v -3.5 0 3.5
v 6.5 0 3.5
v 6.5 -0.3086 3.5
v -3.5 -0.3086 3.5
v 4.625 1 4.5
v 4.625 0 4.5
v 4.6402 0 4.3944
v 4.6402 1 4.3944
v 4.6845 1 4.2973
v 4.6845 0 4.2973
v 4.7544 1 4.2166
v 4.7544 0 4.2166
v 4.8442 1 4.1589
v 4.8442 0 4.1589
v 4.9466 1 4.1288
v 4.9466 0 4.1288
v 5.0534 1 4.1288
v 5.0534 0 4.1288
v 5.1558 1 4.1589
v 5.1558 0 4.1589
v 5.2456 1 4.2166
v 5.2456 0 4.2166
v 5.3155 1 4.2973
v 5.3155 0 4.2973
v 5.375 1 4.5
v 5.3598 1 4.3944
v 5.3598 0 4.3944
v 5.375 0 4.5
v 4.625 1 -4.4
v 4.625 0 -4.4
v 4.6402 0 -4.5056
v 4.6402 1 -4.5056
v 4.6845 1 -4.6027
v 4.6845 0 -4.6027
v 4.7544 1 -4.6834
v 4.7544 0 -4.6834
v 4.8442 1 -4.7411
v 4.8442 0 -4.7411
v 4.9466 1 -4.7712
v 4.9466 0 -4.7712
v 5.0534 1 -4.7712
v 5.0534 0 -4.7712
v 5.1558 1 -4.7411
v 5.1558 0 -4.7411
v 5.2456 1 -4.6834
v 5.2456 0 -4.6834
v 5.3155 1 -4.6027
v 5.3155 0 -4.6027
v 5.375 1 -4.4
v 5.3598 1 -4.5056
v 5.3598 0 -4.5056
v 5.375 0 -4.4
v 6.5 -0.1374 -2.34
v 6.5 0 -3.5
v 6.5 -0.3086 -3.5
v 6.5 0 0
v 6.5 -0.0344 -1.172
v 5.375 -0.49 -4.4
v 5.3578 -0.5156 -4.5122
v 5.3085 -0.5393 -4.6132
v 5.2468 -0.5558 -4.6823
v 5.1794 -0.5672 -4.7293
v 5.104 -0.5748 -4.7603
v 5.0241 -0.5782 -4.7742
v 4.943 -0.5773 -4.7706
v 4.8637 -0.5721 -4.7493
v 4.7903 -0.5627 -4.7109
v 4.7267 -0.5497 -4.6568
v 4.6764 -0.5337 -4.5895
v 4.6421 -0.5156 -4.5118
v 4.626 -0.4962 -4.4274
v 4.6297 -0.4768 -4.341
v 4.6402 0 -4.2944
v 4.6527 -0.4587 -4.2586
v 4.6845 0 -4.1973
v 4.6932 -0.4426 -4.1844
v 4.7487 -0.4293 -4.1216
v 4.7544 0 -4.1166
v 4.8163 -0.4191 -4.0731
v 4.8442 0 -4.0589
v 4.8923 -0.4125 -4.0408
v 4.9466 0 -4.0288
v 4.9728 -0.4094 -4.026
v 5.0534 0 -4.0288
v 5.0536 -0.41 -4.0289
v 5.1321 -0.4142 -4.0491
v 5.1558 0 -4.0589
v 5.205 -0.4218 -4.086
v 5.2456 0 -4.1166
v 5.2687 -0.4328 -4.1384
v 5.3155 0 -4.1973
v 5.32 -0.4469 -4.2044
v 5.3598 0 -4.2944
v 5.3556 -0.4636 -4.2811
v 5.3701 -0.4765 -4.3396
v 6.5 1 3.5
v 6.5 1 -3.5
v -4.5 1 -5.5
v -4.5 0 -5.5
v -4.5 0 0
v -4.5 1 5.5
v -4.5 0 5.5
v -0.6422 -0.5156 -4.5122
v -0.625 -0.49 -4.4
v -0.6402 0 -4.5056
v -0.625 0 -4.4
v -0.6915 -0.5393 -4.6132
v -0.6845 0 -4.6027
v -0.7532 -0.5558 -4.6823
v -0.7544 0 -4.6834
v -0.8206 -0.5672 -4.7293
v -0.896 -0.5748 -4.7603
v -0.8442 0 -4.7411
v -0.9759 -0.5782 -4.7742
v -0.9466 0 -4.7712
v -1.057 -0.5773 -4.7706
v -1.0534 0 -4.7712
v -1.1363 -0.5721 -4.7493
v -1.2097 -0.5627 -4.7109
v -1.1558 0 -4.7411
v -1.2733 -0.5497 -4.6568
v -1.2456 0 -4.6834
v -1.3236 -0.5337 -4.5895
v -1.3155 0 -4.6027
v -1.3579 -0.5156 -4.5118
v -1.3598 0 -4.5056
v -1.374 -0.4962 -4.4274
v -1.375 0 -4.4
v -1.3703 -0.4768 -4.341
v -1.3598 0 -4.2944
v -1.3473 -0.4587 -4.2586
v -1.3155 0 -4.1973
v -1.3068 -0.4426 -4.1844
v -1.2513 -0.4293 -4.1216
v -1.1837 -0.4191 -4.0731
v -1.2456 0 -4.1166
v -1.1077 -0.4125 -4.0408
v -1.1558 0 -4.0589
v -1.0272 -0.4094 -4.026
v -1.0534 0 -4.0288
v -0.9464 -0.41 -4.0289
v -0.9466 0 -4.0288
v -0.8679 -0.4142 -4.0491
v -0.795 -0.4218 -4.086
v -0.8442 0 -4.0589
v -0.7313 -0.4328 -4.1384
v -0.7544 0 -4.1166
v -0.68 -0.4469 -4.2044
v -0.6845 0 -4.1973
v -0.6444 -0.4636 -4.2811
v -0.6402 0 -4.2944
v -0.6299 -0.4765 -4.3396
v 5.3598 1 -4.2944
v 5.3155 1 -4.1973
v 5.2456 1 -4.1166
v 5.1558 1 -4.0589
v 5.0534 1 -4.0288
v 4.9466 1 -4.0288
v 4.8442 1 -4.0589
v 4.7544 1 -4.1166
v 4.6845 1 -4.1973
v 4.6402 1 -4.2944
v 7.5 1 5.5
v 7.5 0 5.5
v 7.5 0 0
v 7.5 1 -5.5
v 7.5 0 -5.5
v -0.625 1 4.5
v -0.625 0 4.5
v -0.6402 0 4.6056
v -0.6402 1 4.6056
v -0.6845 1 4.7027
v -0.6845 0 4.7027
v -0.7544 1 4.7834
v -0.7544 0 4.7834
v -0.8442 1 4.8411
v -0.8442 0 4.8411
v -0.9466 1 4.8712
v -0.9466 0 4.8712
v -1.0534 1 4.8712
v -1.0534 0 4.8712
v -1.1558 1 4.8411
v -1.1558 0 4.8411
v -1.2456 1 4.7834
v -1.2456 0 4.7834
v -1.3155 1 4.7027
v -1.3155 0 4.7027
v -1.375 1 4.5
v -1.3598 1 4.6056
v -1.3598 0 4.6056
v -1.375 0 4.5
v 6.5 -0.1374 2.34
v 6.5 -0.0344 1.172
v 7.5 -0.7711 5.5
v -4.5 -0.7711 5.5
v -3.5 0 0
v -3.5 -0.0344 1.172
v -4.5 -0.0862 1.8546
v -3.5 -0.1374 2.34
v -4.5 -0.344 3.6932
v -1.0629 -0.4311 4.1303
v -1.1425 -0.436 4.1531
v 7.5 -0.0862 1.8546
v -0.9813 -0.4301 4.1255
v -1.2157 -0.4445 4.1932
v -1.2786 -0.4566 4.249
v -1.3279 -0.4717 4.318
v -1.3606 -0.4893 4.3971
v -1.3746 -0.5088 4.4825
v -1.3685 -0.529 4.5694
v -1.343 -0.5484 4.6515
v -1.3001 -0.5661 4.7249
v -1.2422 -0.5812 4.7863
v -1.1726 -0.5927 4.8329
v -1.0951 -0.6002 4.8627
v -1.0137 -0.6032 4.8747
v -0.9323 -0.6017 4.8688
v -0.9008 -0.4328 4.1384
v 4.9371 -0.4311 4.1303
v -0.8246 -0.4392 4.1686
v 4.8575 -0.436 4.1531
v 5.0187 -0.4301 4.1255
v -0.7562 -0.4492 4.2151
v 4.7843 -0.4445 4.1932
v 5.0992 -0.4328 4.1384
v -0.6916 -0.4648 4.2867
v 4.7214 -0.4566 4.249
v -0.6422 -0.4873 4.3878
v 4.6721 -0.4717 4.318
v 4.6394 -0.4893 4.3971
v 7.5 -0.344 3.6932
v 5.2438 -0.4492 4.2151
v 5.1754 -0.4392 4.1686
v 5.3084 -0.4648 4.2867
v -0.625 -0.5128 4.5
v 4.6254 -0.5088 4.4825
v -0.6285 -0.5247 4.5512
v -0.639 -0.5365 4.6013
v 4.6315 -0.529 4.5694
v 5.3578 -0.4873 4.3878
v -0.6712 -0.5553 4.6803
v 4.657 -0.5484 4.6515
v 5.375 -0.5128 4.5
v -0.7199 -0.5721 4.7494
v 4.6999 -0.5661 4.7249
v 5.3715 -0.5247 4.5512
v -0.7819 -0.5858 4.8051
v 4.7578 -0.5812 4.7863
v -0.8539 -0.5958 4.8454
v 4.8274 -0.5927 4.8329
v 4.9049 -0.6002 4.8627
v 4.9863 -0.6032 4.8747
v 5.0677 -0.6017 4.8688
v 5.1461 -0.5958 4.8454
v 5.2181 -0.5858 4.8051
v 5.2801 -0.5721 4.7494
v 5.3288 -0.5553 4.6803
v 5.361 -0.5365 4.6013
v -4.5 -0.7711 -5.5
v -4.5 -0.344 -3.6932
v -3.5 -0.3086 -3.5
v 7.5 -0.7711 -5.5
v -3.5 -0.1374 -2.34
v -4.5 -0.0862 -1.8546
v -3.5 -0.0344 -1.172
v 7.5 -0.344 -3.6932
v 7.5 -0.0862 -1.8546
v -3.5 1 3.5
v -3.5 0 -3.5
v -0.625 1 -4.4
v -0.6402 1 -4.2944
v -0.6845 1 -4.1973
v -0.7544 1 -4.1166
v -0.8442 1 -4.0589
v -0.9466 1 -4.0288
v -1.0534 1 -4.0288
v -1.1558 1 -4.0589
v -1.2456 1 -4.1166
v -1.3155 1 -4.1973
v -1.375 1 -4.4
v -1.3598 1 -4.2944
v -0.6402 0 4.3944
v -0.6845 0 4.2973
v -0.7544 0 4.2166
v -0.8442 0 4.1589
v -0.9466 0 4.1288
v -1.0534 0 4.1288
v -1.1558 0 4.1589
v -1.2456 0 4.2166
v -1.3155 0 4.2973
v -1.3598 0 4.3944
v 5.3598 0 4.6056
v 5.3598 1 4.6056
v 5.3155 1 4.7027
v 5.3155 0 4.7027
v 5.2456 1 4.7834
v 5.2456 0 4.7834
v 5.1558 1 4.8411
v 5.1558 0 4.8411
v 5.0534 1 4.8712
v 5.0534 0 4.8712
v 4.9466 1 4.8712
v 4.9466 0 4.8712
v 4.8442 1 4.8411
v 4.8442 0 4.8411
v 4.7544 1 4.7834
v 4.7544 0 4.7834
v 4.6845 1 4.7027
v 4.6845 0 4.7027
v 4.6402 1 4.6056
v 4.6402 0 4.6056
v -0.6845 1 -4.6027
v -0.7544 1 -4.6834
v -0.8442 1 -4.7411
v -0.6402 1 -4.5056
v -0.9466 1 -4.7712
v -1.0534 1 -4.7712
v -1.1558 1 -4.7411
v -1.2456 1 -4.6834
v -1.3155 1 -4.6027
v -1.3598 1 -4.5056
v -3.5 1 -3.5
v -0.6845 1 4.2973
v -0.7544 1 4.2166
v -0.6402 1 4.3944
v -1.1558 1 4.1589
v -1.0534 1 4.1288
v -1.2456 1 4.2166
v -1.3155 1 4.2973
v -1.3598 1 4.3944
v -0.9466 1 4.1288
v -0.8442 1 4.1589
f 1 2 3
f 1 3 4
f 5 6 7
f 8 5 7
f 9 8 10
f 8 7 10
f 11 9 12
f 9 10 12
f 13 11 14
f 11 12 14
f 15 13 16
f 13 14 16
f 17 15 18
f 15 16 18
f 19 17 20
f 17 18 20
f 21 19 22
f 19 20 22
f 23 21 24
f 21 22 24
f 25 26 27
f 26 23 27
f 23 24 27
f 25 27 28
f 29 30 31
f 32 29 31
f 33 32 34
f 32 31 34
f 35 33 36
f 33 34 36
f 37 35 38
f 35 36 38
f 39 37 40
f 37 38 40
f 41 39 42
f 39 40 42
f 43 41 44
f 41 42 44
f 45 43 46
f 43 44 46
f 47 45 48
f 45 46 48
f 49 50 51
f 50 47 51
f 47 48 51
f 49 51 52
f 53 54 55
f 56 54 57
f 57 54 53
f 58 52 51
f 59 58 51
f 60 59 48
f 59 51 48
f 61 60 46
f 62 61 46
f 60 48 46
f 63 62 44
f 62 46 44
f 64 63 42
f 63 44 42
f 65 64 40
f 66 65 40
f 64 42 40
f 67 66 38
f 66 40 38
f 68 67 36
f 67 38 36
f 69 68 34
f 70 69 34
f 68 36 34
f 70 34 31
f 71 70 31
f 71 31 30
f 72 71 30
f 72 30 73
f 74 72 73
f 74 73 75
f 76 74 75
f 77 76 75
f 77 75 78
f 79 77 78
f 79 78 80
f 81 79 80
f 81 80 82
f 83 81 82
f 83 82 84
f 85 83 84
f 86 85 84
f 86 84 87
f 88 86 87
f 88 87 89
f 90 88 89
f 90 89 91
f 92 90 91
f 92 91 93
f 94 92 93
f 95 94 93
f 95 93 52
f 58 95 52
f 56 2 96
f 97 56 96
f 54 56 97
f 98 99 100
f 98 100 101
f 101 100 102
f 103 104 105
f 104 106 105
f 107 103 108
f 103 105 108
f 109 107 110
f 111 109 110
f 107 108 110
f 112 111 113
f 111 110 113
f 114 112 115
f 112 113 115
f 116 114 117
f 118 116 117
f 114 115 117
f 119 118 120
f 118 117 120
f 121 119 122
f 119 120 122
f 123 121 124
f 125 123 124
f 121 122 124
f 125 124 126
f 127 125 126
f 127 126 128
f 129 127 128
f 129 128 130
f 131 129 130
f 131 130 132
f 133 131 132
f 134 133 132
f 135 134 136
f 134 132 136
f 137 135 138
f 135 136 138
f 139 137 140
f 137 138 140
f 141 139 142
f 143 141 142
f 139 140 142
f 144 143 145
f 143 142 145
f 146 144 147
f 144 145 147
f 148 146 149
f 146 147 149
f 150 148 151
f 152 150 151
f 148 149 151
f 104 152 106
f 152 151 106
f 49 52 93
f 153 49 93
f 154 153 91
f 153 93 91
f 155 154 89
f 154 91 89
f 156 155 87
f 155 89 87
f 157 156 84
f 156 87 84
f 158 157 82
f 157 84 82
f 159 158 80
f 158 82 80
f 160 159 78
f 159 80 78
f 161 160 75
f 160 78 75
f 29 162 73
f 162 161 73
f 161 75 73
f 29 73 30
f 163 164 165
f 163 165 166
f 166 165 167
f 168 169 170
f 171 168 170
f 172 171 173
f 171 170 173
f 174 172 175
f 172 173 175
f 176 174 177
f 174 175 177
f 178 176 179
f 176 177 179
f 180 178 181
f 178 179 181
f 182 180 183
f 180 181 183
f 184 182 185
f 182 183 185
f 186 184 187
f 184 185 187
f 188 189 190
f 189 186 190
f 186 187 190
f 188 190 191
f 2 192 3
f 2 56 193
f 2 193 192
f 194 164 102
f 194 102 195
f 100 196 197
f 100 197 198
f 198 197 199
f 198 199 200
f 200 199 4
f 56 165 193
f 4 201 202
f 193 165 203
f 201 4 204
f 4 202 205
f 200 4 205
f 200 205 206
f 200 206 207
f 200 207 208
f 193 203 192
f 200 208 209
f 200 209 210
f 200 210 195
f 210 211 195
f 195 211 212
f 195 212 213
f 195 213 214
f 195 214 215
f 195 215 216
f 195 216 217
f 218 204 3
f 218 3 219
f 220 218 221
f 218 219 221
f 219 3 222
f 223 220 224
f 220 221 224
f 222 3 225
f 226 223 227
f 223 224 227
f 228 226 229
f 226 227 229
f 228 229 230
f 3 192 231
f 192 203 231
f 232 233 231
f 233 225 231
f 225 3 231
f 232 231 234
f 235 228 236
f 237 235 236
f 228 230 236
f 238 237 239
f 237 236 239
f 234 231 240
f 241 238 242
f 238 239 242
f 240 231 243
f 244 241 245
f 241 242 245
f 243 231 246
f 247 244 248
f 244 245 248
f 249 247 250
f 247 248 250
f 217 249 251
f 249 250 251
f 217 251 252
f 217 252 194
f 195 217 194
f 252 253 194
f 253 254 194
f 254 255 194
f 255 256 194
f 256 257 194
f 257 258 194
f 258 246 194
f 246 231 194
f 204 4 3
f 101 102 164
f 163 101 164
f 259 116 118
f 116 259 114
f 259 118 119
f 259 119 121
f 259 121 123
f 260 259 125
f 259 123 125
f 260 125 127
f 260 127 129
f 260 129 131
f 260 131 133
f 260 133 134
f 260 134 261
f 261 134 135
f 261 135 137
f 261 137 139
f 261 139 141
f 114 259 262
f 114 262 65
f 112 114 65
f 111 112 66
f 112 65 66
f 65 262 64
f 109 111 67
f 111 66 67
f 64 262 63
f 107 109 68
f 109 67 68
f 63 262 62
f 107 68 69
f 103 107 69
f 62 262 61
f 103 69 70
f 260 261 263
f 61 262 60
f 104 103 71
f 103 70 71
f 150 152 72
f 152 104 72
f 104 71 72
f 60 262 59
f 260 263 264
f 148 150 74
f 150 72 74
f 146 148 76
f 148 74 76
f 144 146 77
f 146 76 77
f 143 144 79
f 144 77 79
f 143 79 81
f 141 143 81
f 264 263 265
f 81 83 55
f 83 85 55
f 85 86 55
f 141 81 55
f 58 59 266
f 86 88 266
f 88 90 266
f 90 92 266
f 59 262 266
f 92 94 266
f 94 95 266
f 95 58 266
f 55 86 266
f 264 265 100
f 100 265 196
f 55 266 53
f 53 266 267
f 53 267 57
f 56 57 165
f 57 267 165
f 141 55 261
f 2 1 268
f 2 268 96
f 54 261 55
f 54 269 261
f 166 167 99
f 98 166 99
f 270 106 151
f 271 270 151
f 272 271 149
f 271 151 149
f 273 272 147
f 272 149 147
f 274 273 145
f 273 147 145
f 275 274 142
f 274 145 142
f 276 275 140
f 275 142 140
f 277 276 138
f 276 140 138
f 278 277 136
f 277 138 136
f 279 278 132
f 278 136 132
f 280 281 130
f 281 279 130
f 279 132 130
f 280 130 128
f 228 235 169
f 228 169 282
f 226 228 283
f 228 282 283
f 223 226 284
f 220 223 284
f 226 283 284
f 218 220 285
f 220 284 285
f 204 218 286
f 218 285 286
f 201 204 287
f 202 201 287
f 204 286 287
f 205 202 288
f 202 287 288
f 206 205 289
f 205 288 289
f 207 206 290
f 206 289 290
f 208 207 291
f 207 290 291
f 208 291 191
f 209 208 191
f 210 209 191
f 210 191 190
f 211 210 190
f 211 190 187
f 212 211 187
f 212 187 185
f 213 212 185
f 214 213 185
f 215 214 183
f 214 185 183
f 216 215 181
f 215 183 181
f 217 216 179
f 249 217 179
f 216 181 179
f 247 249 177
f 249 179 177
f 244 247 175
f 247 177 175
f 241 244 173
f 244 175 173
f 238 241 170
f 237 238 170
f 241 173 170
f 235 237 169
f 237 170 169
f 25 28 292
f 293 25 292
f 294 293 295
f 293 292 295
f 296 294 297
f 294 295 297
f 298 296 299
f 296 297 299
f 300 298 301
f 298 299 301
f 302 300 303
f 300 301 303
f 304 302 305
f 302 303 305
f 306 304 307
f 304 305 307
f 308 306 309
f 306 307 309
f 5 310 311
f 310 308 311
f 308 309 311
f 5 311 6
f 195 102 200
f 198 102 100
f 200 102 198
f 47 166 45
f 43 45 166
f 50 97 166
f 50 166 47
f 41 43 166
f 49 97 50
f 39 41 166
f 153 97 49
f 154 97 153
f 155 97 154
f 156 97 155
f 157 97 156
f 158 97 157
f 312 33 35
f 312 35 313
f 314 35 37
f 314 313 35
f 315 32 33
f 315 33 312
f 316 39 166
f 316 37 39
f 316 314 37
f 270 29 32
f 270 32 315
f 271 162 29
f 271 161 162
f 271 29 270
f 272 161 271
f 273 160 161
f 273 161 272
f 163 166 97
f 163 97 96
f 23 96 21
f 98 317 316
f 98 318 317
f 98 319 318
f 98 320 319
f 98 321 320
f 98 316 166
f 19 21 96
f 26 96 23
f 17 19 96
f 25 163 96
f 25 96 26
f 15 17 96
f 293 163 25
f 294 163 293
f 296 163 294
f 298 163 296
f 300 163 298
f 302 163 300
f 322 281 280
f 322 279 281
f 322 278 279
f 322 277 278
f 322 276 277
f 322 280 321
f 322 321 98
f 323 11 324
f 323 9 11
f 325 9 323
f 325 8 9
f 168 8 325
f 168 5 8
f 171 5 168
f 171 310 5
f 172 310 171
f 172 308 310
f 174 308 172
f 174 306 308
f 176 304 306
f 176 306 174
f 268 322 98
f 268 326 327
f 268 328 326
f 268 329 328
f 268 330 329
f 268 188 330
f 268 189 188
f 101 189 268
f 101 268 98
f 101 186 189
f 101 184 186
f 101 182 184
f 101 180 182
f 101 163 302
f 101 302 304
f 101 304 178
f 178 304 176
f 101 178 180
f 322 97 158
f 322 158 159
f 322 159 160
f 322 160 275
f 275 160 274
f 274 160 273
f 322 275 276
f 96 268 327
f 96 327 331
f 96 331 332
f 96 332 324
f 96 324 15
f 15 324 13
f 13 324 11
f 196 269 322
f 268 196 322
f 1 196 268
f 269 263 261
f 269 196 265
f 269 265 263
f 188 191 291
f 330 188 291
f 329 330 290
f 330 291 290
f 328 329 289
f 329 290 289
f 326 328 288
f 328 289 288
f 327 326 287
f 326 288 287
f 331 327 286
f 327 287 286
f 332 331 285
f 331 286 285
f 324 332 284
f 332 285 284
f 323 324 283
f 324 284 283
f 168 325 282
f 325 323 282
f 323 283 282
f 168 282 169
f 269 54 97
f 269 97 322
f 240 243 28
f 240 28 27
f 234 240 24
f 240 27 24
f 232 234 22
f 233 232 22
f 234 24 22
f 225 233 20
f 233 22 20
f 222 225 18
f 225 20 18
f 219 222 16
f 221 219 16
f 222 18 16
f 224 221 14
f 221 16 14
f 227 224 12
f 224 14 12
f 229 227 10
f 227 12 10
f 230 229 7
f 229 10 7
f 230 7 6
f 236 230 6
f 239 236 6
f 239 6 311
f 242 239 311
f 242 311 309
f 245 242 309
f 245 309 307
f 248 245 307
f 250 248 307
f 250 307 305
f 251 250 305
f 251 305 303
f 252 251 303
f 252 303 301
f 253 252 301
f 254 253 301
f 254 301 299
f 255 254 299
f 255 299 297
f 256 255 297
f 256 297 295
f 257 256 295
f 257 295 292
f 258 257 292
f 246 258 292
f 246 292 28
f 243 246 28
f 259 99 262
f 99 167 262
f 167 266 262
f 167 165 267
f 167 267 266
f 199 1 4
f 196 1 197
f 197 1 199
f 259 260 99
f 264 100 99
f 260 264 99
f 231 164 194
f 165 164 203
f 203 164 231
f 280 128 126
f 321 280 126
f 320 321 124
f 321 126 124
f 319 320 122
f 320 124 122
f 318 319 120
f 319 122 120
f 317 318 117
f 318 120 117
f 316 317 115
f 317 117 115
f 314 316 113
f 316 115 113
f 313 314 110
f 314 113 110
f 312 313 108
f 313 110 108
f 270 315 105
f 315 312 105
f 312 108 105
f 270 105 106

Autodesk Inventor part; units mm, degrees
ref_plane "YZ Plane" through (0, 0, 0) normal (1, 0, 0) x (0, 1, 0)
ref_plane "XZ Plane" through (0, 0, 0) normal (0, 1, 0) x (-1, 0, 0)
ref_plane "XY Plane" through (0, 0, 0) normal (0, 0, 1) x (1, 0, 0)
sketch "Sketch1" plane through (0, 0, 0) normal (0, 1, 0) x (-1, 0, 0)
  line L0 (4.5, 5.5) -> (-7.5, 5.5)
  line L1 (-7.5, 5.5) -> (-7.5, -5.5)
  line L2 (-7.5, -5.5) -> (4.5, -5.5)
  line L3 (4.5, -5.5) -> (4.5, 5.5)
  line L4 (3.5, 3.5) -> (-6.5, 3.5)
  line L5 (-6.5, 3.5) -> (-6.5, -3.5)
  line L6 (-6.5, -3.5) -> (3.5, -3.5)
  line L7 (3.5, -3.5) -> (3.5, 3.5)
  circle A0 centre (1, 4.5) radius 0.375
  circle A1 centre (1, -4.4) radius 0.375
  circle A2 centre (-5, 4.5) radius 0.375
  circle A3 centre (-5, -4.4) radius 0.375
  point P0 (0, 0)
  dimension "d0" = 12
  dimension "d1" = 11
  dimension "d2" = 5.5
  dimension "d3" = 7.5
  dimension "d4" = 10
  dimension "d5" = 7
  dimension "d6" = 2
  dimension "d7" = 1
  dimension "d8" = 0.75
  dimension "d9" = 3.5
  dimension "d10" = 1
  dimension "d13" = 8.9
  dimension "d16" = 6
extrude "Extrusion1" add sketch "Sketch1" along normal blind 1
sketch "Sketch2" plane through (7.5, 0, 5.5) normal (1, 0, 0) x (0, 0, -1)
  circle A0 centre (5.5, -20) radius 20 projected
  line L0 (0, 0) -> (11, 0) projected
  line L1 (0, 0) -> (0, -0.7711)
  line L2 (11, 0) -> (11, -0.7711)
  arc A1 (11, -0.7711) -> (0, -0.7711) centre (5.5, -20) ccw
  point P0 (5.5, 0)
extrude "Extrusion2" add sketch "Sketch2" against normal up to surface (12 mm away) contours A0 L0 L2 | L1 L0 A0
sketch "Sketch3" plane through (0, 1, 0) normal (0, 1, 0) x (1, 0, 0)
  circle A0 centre (5, 4.4) radius 0.375 projected
  circle A1 centre (5, -4.5) radius 0.375 projected
  circle A2 centre (-1, -4.5) radius 0.375 projected
  circle A3 centre (-1, 4.4) radius 0.375 projected
  line L0 (6.5, 3.5) -> (6.5, -3.5) projected
  line L1 (-3.5, 3.5) -> (6.5, 3.5) projected
  line L2 (-3.5, -3.5) -> (-3.5, 3.5) projected
  line L3 (6.5, -3.5) -> (-3.5, -3.5) projected
  line L4 (6.5, 3.5) -> (-3.5, 3.5)
  line L5 (-3.5, 3.5) -> (-3.5, -3.5)
  line L6 (-3.5, -3.5) -> (6.5, -3.5)
  line L7 (6.5, -3.5) -> (6.5, 3.5)
  circle A4 centre (5, 4.4) radius 0.375
  circle A5 centre (5, -4.5) radius 0.375
  circle A6 centre (-1, -4.5) radius 0.375 projected
  circle A7 centre (-1, -4.5) radius 0.375
  circle A8 centre (-1, 4.4) radius 0.375
  point P0 (0, 0)
extrude "Extrusion3" cut sketch "Sketch3" against normal through all
properties part number "Eyepiece Mount"
